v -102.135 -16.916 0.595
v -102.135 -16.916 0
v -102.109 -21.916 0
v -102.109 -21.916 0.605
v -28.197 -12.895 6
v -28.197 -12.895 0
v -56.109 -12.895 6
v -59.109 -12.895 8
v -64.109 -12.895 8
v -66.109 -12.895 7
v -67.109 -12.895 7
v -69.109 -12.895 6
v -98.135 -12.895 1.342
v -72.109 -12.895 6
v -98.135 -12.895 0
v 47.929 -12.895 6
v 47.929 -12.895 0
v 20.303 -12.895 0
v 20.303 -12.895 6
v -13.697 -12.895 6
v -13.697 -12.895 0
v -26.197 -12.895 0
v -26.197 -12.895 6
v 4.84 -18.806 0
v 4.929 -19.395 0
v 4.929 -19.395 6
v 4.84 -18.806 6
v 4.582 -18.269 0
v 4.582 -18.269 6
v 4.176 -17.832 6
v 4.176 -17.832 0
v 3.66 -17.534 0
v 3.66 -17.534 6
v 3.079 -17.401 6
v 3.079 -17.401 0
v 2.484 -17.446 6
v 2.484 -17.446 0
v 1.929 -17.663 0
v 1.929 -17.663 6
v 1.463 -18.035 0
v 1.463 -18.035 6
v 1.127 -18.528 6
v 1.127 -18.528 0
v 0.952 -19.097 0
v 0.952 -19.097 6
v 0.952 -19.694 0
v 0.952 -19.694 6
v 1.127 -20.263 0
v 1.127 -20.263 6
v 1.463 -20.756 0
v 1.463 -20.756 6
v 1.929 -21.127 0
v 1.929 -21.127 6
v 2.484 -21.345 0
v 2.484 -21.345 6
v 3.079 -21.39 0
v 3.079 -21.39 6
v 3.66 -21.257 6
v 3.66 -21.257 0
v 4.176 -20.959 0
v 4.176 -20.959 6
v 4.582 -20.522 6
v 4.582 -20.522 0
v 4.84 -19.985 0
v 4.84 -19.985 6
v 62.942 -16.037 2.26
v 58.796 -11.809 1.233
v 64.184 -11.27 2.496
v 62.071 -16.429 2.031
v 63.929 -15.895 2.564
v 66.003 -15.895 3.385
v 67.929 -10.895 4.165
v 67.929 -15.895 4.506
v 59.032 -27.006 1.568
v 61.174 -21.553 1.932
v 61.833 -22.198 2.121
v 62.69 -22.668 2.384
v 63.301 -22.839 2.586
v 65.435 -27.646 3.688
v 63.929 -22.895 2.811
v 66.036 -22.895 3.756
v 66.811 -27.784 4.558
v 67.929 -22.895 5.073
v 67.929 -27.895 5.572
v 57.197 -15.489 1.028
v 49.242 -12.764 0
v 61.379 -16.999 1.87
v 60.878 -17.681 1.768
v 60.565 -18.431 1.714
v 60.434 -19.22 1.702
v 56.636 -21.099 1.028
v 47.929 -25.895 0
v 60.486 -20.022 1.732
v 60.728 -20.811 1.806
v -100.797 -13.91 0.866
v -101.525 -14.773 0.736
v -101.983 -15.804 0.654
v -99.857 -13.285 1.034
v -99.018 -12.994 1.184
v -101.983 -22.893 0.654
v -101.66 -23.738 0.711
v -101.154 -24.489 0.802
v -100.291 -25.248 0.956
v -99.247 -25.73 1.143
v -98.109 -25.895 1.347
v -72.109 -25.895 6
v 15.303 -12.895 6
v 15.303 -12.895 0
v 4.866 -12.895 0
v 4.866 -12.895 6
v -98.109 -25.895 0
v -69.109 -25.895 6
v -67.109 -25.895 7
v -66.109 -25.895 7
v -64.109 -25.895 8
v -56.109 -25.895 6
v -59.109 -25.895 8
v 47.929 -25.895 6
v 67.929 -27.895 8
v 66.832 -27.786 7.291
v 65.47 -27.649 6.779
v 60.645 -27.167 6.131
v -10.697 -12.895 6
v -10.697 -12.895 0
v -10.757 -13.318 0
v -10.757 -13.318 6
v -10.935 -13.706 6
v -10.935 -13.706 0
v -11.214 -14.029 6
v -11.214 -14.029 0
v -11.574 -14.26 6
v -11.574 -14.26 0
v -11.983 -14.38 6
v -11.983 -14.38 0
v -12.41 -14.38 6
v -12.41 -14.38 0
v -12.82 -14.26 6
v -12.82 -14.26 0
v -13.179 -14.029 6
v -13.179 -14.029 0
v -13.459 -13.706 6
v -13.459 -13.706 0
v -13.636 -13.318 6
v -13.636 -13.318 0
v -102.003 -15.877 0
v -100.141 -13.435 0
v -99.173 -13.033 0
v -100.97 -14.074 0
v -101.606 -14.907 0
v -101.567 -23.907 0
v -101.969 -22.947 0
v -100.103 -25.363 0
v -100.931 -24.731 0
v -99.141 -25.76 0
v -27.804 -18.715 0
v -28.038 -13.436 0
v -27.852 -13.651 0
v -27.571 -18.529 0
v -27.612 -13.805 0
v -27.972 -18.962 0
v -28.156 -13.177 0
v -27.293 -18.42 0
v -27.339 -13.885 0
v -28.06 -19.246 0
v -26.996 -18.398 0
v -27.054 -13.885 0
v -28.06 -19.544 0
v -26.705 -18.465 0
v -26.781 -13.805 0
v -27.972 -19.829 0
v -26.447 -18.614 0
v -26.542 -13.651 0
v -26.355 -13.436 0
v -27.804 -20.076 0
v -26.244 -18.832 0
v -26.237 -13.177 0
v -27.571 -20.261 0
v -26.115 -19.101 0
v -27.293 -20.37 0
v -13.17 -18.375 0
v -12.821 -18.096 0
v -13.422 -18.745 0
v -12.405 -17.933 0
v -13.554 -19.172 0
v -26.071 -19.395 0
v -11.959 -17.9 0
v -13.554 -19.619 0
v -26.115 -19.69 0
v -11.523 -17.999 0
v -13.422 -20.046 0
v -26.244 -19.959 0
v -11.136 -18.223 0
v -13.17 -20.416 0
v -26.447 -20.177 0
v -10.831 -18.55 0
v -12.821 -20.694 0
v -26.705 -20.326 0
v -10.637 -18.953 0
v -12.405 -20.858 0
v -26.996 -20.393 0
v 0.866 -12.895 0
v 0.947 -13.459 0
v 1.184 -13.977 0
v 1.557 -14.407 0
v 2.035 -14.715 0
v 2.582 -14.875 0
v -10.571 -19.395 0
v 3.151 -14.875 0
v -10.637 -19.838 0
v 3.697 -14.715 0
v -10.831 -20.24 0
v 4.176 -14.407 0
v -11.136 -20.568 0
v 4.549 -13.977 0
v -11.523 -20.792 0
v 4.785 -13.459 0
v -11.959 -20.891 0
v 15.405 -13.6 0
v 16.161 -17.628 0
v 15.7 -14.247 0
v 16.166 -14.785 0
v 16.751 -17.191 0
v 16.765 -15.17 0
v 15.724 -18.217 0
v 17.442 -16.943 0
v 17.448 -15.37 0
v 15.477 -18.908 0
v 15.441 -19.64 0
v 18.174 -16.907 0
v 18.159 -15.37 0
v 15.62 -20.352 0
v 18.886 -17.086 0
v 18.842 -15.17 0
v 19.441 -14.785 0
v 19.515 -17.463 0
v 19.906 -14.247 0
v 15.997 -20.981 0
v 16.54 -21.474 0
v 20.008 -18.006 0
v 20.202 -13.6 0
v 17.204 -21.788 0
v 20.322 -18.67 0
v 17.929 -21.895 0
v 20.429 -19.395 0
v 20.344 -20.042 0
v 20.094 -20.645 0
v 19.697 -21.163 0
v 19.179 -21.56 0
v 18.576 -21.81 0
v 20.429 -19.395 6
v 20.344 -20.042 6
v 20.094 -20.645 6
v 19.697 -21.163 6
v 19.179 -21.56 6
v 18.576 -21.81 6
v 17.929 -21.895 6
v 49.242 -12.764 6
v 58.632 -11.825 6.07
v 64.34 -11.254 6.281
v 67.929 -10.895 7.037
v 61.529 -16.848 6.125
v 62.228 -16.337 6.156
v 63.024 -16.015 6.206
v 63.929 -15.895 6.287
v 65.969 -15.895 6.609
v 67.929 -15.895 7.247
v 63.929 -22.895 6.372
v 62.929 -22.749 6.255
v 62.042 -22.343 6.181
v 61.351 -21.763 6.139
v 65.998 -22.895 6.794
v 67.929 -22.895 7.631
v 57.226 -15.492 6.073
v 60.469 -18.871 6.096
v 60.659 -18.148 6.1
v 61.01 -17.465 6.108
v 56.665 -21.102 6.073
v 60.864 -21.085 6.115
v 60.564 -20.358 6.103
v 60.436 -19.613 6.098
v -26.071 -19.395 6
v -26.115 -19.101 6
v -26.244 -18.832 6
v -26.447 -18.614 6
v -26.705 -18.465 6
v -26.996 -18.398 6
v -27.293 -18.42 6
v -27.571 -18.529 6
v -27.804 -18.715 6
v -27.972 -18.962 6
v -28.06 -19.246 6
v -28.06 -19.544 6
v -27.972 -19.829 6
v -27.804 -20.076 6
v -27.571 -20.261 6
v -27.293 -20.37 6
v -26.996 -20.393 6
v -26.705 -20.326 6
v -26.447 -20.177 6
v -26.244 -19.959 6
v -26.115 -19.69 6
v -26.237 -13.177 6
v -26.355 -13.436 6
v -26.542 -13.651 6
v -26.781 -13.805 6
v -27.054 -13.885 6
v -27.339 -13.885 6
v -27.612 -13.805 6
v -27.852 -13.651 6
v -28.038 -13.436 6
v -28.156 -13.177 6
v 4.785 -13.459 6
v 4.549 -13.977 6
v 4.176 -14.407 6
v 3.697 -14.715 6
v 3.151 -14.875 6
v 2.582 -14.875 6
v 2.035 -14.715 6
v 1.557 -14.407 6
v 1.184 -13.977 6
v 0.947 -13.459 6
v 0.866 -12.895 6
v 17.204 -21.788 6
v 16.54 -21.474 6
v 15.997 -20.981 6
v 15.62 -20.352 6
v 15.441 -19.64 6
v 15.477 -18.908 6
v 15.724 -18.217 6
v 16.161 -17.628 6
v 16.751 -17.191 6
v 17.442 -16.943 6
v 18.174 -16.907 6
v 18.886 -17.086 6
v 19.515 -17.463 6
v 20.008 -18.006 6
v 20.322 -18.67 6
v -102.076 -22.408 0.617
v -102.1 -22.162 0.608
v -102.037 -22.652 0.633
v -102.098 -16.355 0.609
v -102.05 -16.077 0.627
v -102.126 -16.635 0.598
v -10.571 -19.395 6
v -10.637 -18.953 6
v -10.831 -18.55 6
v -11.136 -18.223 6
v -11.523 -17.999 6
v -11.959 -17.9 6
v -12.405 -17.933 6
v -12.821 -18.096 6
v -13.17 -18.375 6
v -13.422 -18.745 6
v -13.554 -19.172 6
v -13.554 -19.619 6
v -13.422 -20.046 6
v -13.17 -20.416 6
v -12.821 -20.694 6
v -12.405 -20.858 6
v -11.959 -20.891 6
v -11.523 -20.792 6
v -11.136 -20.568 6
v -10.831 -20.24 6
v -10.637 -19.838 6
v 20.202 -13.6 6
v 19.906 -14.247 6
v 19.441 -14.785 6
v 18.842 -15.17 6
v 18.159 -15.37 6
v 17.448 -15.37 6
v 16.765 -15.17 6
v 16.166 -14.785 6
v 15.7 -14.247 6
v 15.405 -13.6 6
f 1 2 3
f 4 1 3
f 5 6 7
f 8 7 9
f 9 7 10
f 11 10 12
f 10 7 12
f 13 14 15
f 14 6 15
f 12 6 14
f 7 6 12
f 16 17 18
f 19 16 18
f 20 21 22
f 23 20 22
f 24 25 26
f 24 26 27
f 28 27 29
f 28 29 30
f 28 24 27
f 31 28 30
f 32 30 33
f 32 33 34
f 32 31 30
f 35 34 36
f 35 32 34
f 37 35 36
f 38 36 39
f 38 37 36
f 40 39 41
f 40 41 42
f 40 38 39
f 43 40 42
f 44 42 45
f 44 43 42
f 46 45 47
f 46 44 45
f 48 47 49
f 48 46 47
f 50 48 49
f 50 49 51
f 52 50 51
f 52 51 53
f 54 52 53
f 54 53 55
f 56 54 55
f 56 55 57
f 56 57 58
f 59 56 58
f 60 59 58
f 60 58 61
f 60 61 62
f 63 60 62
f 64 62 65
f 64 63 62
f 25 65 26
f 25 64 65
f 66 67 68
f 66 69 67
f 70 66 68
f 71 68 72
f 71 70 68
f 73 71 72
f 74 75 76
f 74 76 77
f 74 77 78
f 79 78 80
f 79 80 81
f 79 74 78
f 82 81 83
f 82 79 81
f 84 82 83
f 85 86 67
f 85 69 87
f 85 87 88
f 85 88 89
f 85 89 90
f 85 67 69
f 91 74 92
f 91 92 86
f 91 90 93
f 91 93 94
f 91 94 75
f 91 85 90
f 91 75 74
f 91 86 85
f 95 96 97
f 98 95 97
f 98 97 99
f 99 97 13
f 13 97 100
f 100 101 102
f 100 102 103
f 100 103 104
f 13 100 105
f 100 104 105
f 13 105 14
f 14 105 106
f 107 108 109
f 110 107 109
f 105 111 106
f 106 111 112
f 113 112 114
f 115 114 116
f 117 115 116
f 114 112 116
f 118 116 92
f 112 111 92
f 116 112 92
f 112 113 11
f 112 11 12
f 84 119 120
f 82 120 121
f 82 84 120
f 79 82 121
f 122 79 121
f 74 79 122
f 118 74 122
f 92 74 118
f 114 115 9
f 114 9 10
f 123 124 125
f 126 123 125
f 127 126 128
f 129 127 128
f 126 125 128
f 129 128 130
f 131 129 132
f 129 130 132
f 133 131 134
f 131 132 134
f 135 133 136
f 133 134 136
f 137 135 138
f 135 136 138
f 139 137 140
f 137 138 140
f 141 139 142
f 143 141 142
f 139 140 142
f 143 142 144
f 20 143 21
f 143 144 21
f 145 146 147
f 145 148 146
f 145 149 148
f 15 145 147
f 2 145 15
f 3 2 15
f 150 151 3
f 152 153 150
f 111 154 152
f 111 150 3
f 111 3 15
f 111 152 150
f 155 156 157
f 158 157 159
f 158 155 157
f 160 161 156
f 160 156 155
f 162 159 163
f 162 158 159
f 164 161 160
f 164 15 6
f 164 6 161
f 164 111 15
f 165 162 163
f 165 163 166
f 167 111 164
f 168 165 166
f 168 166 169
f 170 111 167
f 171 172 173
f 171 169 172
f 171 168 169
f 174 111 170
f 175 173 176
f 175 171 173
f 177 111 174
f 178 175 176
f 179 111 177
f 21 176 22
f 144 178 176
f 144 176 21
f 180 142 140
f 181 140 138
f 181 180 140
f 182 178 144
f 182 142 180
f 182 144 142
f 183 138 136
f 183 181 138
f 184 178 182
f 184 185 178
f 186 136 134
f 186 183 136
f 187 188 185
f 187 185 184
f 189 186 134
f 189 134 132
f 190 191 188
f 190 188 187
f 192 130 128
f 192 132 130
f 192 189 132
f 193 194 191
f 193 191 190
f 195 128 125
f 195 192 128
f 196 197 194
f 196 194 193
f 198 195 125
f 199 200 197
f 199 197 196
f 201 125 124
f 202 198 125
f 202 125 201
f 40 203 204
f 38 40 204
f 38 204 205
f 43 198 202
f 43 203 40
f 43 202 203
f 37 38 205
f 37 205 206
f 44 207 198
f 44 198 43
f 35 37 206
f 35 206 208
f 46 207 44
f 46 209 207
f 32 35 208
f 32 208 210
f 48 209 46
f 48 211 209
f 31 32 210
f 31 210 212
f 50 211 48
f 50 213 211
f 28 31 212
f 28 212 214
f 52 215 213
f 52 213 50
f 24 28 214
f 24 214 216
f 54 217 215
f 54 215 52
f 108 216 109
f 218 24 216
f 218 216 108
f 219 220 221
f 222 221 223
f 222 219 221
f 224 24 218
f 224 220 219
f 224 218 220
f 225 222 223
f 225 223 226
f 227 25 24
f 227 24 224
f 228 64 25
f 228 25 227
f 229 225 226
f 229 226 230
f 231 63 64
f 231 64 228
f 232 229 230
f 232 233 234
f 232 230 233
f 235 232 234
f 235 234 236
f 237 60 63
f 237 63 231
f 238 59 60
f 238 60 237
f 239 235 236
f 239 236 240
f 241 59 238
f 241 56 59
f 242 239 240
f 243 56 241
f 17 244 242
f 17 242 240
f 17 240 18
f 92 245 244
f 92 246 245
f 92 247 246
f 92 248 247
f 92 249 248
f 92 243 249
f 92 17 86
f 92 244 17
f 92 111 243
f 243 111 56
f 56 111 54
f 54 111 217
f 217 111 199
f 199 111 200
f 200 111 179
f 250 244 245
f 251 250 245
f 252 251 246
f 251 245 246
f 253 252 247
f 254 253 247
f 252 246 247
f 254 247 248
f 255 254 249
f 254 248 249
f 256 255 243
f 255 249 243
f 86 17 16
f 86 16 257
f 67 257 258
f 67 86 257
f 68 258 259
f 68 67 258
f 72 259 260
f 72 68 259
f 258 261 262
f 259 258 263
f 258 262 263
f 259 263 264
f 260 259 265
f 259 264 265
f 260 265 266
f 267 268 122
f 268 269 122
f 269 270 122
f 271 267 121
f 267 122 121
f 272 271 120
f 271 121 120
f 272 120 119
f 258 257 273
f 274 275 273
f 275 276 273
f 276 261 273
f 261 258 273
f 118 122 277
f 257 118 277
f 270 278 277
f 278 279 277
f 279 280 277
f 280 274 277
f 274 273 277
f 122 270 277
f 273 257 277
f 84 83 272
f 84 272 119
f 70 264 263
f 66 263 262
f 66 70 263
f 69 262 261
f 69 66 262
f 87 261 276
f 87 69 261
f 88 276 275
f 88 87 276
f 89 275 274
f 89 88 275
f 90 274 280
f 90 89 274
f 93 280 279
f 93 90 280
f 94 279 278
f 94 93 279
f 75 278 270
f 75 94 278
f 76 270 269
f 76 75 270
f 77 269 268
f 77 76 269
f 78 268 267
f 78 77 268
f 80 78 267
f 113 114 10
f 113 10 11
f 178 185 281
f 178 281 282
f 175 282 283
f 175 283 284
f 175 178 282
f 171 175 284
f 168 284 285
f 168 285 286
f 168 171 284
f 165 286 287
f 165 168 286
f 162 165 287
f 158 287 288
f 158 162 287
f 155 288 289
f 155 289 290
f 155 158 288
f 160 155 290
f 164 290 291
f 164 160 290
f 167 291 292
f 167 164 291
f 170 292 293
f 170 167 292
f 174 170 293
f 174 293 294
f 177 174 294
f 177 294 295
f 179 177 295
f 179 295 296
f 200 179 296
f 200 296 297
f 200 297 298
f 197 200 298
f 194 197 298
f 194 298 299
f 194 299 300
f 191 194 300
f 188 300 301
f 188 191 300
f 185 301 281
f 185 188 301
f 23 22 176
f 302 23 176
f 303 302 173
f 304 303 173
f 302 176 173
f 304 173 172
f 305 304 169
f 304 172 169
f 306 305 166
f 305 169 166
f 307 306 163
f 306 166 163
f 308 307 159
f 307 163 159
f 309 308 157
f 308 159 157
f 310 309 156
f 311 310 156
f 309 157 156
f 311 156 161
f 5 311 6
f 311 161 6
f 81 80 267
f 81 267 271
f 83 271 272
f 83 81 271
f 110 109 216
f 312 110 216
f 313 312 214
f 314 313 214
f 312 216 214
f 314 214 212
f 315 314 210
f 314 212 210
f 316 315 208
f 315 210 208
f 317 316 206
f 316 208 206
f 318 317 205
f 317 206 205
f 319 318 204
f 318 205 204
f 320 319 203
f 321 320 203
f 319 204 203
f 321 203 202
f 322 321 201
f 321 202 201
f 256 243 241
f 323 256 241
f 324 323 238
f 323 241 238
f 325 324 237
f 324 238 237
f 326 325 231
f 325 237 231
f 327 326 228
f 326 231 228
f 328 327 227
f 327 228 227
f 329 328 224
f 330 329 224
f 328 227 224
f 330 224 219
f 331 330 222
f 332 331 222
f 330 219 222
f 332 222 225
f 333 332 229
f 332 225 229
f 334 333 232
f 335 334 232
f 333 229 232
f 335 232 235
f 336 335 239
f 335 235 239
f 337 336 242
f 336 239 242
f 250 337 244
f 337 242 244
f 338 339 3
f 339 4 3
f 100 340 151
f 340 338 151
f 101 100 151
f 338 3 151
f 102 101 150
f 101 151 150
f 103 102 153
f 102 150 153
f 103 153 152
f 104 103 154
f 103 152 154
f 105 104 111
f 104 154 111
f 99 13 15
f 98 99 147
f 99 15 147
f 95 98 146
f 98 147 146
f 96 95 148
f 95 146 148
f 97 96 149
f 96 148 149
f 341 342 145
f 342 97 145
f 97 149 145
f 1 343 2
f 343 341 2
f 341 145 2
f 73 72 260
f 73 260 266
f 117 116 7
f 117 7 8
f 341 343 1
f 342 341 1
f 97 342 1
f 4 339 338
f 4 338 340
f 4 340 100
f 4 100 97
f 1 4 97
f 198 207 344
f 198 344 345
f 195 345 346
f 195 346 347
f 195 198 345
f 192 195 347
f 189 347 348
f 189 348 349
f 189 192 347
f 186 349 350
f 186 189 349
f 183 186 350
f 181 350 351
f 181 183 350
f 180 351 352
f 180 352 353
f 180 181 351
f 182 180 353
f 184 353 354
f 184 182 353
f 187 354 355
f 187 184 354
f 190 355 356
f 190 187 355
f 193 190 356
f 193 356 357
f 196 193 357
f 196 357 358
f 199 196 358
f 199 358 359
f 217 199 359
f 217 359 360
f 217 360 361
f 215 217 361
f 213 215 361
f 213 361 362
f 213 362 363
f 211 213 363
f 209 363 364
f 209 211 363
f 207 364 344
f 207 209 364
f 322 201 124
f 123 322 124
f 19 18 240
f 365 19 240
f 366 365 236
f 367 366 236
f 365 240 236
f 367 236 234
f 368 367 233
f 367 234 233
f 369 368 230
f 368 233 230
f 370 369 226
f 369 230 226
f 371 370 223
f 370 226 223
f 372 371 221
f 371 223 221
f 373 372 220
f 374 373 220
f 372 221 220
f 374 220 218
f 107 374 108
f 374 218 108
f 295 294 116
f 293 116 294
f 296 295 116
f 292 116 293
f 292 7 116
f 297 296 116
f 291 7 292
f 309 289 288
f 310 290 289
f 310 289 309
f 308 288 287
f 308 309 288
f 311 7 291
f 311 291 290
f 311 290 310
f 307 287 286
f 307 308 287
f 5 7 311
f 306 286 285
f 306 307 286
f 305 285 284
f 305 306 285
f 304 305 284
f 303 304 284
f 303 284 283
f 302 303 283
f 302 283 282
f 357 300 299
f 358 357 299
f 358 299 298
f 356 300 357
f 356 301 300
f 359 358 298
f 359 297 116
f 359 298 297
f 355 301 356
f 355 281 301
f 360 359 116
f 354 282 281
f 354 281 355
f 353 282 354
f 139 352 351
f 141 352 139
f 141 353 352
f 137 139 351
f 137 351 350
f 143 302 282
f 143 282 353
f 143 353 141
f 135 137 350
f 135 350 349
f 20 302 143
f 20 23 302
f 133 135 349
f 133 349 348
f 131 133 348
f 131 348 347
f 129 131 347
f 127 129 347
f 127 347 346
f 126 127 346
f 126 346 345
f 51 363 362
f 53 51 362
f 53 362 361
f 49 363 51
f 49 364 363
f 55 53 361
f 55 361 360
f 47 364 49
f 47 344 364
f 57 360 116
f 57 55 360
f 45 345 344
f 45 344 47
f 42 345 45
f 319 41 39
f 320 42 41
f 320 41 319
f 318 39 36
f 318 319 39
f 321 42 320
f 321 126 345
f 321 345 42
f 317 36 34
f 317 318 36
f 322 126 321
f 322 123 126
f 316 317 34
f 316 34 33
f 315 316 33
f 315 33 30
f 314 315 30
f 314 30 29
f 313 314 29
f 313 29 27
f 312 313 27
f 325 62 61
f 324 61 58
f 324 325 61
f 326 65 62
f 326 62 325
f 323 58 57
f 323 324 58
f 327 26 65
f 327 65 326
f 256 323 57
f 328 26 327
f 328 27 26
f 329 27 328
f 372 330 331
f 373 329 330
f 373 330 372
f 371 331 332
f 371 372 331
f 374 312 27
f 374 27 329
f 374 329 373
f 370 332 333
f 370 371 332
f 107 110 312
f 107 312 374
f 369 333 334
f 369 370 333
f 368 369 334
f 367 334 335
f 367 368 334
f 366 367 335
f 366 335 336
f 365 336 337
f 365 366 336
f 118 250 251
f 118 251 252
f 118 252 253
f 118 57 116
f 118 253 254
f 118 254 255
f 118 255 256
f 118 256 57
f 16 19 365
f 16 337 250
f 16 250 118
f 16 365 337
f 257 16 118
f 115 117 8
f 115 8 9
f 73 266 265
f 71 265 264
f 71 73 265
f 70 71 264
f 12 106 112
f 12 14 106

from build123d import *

# Parameters (mm, degrees)
F0_R     = 1
F0_R_2   = 1.5
F0_R_3   = 2
F1_DEPTH = 6
F3_DEPTH = 8
F5_DEPTH = 25
F7_DEPTH = 25
F9_DEPTH = 13


# Not quite as in the source:
# - a feature names something its author has since deleted; it is built from what else it names


with BuildPart() as f1:
    # F0 (on Top) → F1 (new body)
    with BuildSketch(Plane.XY):
        with BuildLine():
            Line((-42.1966487169, -12.8954221606), (-42.1966487169, -25.8954221606))
            Line((-42.1966487169, -25.8954221606), (17.9292613268, -25.8954221606))
            Line((17.9292613268, -25.8954221606), (47.9292613268, -25.8954221606))
            Line((47.9292613268, -25.8954221606), (47.9292613268, -12.8954221606))
            Line((47.9292613268, -12.8954221606), (20.3033512831, -12.8954221606))
            ThreePointArc((20.3033512831, -12.8954221606), (17.8033512831, -15.3954221606), (15.3033512831, -12.8954221606))
            Line((15.3033512831, -12.8954221606), (4.8663063049, -12.8954221606))
            ThreePointArc((4.8663063049, -12.8954221606), (2.8663063049, -14.8954221606), (0.8663063049, -12.8954221606))
            Line((0.8663063049, -12.8954221606), (-10.6966487169, -12.8954221606))
            ThreePointArc((-10.6966487169, -12.8954221606), (-12.1966487169, -14.3954221606), (-13.6966487169, -12.8954221606))
            Line((-13.6966487169, -12.8954221606), (-26.1966487169, -12.8954221606))
            ThreePointArc((-26.1966487169, -12.8954221606), (-27.1966487169, -13.8954221606), (-28.1966487169, -12.8954221606))
            Line((-28.1966487169, -12.8954221606), (-42.1966487169, -12.8954221606))
        make_face()
        with Locations((-27.0707386732, -19.3954221606)):
            Circle(F0_R, mode=Mode.SUBTRACT)
        with Locations((-12.0707386732, -19.3954221606)):
            Circle(F0_R_2, mode=Mode.SUBTRACT)
        with Locations((2.9292613268, -19.3954221606)):
            Circle(F0_R_3, mode=Mode.SUBTRACT)
        with BuildLine():
            ThreePointArc((20.4292613268, -19.3954221606), (19.6970282798, -21.1631891136), (17.9292613268, -21.8954221606))
            ThreePointArc((17.9292613268, -21.8954221606), (16.1614943738, -17.6276552077), (20.4292613268, -19.3954221606))
        make_face(mode=Mode.SUBTRACT)
        with BuildLine():
            ThreePointArc((-102.1092408178, -21.9157785711), (-100.9305134828, -24.7310372299), (-98.109292616, -25.8954221606))
            Line((-98.109292616, -25.8954221606), (-42.1966487169, -25.8954221606))
            Line((-42.1966487169, -25.8954221606), (-42.1966487169, -12.8954221606))
            Line((-42.1966487169, -12.8954221606), (-98.1347384587, -12.8954221606))
            ThreePointArc((-98.1347384587, -12.8954221606), (-100.9703535279, -14.0742012939), (-102.1346866604, -16.9157785711))
            Line((-102.1346866604, -16.9157785711), (-102.1092408178, -21.9157785711))
        make_face()
    extrude(amount=F1_DEPTH)

    # F2 (on face) → F3 (join)
    with BuildSketch(Plane(origin=(0, 0, 0), x_dir=(1, 0, 0), z_dir=(0, 0, -1))):
        with BuildLine():
            Line((47.9292613268, 25.8954221606), (47.9292613268, 12.8954221606))
            Line((47.9292613268, 12.8954221606), (67.9292613268, 10.8954221606))
            Line((67.9292613268, 10.8954221606), (67.9292613268, 15.8954221606))
            Line((67.9292613268, 15.8954221606), (63.9292613268, 15.8954221606))
            ThreePointArc((63.9292613268, 15.8954221606), (60.4292613268, 19.3954221606), (63.9292613268, 22.8954221606))
            Line((63.9292613268, 22.8954221606), (67.9292613268, 22.8954221606))
            Line((67.9292613268, 22.8954221606), (67.9292613268, 27.8954221606))
            Line((67.9292613268, 27.8954221606), (47.9292613268, 25.8954221606))
        make_face()
    extrude(amount=-F3_DEPTH)

    # F4 (on face) → F5 (cut)
    with BuildSketch(Plane(origin=(-2.0893560424, -20.8935604237, 0), x_dir=(0.9950371902, -0.099503719, 0), z_dir=(-0.099503719, -0.9950371902, 0))):
        with BuildLine():
            Line((47.7105565369, 6), (50.2680883301, 6))
            Line((50.2680883301, 6), (50.2680883301, 8))
            Line((50.2680883301, 8), (70.3678395723, 8))
            add(Edge.make_bspline(
                [(70.3678395723, 8), (72.5767643682, 9.8820103785), (72.4269967916, 13.5723014467), (72.296127677, 17.0164462179)],
                knots=[0.596790788, 0.596790788, 0.596790788, 0.596790788, 1, 1, 1, 1], degree=3))
            add(Edge.make_bspline(
                [(70.3678395723, 5.5720340461), (72.8712183365, 8.3489220533), (72.5836730067, 12.6826841356), (72.296127677, 17.0164462179)],
                knots=[0.5727584581, 0.5727584581, 0.5727584581, 0.5727584581, 1, 1, 1, 1], degree=3))
            Line((70.3678395723, 5.5720340461), (70.3678395723, 0))
            Line((70.3678395723, 0), (50.2680883301, 0))
            Line((50.2680883301, 0), (50.2680883301, -3.928697668))
            Line((50.2680883301, -3.928697668), (74.866913259, -3.928697668))
            Line((74.866913259, -3.928697668), (74.866913259, 21.5322930813))
            Line((74.866913259, 21.5322930813), (50.2680883301, 21.5322930813))
            Line((50.2680883301, 21.5322930813), (47.7105565369, 21.5322930813))
            Line((47.7105565369, 21.5322930813), (47.7105565369, 6))
        make_face()
        with BuildLine():
            Line((50.2680883301, 8), (50.2680883301, 6))
            add(Edge.make_bspline(
                [(50.2680883301, 6), (58.6617788579, 6.3902694532), (67.098405416, 5.2144325486), (70.3678395723, 8)],
                knots=[0, 0, 0, 0, 0.596790788, 0.596790788, 0.596790788, 0.596790788], degree=3))
            Line((70.3678395723, 8), (50.2680883301, 8))
        make_face()
        with BuildLine():
            add(Edge.make_bspline(
                [(50.2680883301, 0), (58.6399537153, 0.9246740387), (67.0118191006, 1.8493480774), (70.3678395723, 5.5720340461)],
                knots=[0, 0, 0, 0, 0.5727584581, 0.5727584581, 0.5727584581, 0.5727584581], degree=3))
            Line((50.2680883301, 0), (70.3678395723, 0))
            Line((70.3678395723, 0), (70.3678395723, 5.5720340461))
        make_face()
    extrude(amount=-F5_DEPTH, mode=Mode.SUBTRACT)

    # F6 (on face) → F7 (cut)
    with BuildSketch(Plane.XZ.offset(25.8954221606)):
        Polygon((-103.6658883095, 0), (-101.9829884171, 0.653559342), (-72.109292616, 6), (-72.109292616, 8.9457267895), (-103.4941226244, 6.6766636446), align=None)
    extrude(amount=-F7_DEPTH, mode=Mode.SUBTRACT)

    # F8 (on face) → F9 (join)
    with BuildSketch(Plane.XZ.offset(25.8954221606)):
        Polygon((-67.109292616, 7), (-69.109292616, 6), (-67.109292616, 6), (-56.109292616, 6), (-59.109292616, 8), (-64.109292616, 8), (-66.109292616, 7), align=None)
    extrude(amount=-F9_DEPTH)


solid = f1.part
